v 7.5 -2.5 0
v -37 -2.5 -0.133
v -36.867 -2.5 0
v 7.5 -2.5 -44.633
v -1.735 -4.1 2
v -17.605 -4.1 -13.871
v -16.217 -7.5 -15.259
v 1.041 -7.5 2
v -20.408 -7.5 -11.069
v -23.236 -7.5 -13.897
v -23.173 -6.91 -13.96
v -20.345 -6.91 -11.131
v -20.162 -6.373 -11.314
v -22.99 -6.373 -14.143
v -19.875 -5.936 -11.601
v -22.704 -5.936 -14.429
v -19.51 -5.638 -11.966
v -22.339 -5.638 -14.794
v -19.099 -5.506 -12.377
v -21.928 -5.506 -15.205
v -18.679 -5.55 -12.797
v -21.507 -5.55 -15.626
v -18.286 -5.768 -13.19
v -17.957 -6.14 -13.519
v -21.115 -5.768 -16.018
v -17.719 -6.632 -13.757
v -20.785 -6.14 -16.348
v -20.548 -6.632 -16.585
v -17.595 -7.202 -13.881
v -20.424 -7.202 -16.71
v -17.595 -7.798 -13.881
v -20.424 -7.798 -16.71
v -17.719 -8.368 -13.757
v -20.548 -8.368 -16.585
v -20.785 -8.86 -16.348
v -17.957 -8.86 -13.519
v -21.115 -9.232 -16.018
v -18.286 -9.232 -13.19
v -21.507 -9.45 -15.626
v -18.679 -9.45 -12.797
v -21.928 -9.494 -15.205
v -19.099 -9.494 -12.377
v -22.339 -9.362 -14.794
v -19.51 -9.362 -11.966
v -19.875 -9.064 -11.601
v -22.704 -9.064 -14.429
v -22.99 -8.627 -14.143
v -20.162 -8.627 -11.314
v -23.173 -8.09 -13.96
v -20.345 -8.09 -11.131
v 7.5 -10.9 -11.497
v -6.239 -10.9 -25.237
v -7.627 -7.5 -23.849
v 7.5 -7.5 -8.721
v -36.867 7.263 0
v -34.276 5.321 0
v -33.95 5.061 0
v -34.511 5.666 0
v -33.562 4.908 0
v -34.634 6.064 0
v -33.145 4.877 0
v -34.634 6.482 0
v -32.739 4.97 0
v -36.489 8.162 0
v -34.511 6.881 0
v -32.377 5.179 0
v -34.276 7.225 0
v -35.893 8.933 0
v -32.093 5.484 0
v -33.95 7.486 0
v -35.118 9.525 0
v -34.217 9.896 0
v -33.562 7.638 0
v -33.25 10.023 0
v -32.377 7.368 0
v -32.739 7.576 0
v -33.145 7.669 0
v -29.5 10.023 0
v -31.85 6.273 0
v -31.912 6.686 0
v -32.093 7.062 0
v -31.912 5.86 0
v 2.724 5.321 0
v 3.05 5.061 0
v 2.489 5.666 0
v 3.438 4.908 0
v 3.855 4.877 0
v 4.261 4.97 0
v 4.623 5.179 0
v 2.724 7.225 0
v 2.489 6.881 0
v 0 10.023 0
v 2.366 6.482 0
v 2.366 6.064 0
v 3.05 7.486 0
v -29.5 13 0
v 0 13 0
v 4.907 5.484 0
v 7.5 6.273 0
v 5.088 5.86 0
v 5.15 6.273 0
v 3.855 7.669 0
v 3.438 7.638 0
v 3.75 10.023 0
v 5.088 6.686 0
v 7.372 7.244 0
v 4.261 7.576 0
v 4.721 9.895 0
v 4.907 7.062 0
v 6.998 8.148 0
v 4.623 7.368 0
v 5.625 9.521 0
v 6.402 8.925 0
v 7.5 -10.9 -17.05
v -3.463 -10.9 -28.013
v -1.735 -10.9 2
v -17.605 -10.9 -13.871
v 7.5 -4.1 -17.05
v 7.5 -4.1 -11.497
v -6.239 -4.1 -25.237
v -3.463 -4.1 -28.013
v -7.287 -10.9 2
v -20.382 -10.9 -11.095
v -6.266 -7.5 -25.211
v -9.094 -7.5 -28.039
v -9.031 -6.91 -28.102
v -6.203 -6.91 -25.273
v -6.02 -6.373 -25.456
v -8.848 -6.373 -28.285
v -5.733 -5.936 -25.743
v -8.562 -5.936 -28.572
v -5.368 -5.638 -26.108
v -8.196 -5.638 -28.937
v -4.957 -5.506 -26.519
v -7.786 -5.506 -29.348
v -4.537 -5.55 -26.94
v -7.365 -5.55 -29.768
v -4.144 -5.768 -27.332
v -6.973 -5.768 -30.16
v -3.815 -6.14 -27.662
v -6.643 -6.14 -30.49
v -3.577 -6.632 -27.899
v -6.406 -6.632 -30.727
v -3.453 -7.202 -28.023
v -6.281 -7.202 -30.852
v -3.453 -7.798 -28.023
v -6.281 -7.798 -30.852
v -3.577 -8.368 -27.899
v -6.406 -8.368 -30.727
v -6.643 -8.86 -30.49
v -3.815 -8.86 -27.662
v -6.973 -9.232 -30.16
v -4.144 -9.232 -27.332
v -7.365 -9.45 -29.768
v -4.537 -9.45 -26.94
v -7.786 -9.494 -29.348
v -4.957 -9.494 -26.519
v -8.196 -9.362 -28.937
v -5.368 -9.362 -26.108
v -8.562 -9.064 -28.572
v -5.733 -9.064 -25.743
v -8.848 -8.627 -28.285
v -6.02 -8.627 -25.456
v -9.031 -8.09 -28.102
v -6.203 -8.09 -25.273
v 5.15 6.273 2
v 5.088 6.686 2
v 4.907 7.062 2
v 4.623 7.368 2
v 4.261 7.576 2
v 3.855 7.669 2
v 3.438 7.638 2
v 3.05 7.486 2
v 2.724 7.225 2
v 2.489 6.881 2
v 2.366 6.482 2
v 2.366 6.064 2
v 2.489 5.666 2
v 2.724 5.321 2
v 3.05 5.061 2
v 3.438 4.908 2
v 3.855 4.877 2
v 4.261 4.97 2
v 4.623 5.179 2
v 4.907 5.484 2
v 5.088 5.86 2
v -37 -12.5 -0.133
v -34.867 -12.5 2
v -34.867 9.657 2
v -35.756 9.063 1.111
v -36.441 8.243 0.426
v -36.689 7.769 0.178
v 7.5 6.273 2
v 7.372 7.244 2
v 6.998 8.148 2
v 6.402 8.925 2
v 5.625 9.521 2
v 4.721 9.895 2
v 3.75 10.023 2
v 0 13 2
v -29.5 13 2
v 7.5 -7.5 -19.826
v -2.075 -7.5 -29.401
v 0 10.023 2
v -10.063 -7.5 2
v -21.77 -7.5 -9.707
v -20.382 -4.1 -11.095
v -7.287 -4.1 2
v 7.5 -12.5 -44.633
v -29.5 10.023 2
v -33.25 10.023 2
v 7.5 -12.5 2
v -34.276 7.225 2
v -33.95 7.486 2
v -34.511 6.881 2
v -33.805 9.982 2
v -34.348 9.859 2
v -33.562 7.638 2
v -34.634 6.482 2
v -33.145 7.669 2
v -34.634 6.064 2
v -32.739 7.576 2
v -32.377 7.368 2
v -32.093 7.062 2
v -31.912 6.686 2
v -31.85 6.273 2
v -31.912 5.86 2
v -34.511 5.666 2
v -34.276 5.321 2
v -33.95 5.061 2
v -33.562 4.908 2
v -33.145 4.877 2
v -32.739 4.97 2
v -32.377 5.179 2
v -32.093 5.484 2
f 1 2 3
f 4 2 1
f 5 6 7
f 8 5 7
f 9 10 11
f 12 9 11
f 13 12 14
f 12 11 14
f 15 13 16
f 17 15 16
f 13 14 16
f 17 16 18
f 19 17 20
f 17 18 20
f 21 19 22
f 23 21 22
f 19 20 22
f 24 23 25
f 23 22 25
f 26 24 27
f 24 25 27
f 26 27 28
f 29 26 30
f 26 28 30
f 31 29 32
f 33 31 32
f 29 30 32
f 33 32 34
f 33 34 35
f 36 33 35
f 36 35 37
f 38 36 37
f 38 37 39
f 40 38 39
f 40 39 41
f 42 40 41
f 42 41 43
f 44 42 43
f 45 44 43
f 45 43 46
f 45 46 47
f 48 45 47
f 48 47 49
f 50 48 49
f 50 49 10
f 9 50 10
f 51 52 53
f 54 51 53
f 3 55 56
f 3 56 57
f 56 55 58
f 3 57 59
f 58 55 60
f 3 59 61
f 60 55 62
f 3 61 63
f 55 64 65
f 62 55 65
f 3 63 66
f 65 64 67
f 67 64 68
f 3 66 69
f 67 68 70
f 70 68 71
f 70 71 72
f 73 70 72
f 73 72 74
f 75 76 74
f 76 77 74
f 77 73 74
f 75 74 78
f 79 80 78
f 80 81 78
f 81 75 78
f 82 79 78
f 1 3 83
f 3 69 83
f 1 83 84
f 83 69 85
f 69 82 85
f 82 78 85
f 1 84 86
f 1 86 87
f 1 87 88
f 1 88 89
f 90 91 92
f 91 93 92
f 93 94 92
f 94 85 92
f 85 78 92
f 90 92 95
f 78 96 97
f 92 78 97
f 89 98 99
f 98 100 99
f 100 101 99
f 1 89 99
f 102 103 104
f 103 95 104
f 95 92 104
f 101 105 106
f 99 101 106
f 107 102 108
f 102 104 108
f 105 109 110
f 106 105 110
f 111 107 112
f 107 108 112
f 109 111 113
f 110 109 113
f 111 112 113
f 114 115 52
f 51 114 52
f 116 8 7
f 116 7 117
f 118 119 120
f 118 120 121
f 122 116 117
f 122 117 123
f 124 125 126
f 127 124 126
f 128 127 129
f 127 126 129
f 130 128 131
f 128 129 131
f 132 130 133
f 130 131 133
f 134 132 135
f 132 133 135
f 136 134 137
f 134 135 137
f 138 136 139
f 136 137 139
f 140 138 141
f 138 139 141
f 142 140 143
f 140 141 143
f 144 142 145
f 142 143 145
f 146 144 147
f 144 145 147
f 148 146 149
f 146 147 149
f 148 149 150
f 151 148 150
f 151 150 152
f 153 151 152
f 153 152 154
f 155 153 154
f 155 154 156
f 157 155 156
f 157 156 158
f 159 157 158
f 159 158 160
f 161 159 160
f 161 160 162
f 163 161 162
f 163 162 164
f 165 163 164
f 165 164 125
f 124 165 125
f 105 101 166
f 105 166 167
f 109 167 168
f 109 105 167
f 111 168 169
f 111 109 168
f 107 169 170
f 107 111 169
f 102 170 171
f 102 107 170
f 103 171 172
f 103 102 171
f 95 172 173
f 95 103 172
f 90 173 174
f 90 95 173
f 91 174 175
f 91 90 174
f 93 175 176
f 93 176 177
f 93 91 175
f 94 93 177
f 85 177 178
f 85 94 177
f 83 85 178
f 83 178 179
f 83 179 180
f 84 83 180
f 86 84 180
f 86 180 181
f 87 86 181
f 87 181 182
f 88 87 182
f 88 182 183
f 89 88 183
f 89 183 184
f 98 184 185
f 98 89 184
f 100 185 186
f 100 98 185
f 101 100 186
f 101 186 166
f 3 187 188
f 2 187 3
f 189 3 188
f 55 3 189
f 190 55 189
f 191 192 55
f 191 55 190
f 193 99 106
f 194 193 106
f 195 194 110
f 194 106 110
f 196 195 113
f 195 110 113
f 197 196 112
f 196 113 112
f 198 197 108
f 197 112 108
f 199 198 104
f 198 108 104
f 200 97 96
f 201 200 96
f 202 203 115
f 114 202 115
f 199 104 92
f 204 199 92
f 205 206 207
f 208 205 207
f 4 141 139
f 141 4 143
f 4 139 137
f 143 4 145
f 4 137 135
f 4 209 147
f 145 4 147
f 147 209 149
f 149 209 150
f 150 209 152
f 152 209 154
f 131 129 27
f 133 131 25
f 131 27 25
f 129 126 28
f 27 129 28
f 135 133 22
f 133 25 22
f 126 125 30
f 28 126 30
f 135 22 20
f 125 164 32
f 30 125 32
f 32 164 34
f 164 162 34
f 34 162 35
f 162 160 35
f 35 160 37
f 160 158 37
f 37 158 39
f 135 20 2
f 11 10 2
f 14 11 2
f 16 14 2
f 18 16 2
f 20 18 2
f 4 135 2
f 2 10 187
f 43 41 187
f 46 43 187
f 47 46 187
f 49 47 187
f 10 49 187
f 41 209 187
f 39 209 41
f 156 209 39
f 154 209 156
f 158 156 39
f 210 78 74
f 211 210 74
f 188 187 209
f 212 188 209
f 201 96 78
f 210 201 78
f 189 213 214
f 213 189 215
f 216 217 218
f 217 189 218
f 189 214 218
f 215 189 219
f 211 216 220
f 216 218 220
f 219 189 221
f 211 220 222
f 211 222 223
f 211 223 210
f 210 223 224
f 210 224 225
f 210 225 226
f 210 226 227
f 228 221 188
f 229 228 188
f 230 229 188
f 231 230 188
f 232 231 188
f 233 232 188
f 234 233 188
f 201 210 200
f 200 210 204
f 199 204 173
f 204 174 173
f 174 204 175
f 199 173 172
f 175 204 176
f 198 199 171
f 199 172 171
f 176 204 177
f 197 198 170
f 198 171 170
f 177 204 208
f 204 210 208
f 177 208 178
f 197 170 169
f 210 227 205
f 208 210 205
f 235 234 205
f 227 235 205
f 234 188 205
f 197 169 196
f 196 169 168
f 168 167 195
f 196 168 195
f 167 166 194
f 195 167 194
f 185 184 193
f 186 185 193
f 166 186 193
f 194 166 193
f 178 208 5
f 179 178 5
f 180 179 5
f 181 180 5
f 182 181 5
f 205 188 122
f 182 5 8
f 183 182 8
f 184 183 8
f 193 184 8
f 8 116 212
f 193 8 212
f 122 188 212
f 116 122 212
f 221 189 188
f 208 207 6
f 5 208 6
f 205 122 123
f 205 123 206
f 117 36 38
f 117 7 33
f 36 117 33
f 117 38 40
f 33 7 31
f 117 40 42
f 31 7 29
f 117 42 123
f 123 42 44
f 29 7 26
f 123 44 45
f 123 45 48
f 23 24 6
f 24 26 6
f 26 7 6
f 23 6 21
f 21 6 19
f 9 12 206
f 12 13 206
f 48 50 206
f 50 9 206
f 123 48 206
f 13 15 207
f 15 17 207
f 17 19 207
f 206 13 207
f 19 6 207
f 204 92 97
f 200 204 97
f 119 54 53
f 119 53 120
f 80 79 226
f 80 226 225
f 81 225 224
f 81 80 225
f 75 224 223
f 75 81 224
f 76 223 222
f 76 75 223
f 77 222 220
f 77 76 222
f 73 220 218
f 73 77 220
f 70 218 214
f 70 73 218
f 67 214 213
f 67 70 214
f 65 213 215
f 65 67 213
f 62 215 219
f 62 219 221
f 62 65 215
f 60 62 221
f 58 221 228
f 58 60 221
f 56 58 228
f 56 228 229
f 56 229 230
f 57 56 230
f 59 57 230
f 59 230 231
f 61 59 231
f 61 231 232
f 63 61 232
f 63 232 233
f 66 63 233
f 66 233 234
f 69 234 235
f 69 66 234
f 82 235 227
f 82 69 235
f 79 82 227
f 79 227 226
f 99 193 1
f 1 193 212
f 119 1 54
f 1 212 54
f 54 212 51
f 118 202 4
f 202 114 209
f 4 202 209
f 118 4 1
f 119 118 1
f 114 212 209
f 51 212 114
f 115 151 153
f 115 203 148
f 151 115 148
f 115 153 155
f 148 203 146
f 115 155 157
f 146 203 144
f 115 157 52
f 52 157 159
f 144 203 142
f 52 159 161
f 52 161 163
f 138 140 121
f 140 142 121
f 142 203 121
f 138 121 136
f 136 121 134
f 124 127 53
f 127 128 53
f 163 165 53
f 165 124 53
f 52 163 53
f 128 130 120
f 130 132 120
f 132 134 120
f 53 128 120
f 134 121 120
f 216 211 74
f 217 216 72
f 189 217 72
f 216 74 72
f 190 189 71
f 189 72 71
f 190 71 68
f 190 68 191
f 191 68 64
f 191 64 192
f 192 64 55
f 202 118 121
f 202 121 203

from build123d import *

# Parameters (mm, degrees)
SKETCH1_R           = 1.4
BOSS_EXTRUDE1_DEPTH = 2
BOSS_EXTRUDE2_START = -12.5
BOSS_EXTRUDE2_DEPTH = 10
SKETCH2_R           = 2
CUT_EXTRUDE1_DEPTH  = 40.088742751
CUT_EXTRUDE2_START  = -4
SKETCH2_3_R         = 2
CUT_EXTRUDE2_DEPTH  = 36.088742751
SKETCH4_W           = 3.030010437
SKETCH4_H           = 28.00665459
CUT_EXTRUDE3_DEPTH  = 40.088742751


# Read off the part's stored shape, not the designer's step: Boss-Extrude2
with BuildPart() as part:
    # Sketch1 → Boss-Extrude1 (new body)
    with BuildSketch(Plane.XY):
        with BuildLine():
            Line((7.5, -2.5), (7.5, 6.273123532))
            ThreePointArc((7.5, 6.273123532), (6.401650429, 8.924773961), (3.75, 10.023123532))
            Line((3.75, 10.023123532), (0, 10.023123532))
            Line((0, 10.023123532), (0, 13))
            Line((0, 13), (-29.5, 13))
            Line((-29.5, 13), (-29.5, 10.023123532))
            Line((-29.5, 10.023123532), (-33.25, 10.023123532))
            ThreePointArc((-33.25, 10.023123532), (-35.901650429, 8.924773961), (-37, 6.273123532))
            Line((-37, 6.273123532), (-37, -2.5))
            Line((-37, -2.5), (7.5, -2.5))
        make_face()
        with Locations((3.75, 6.273123532)):
            Circle(SKETCH1_R, mode=Mode.SUBTRACT)
        with Locations((-33.25, 6.273123532)):
            Circle(SKETCH1_R, mode=Mode.SUBTRACT)
    extrude(amount=BOSS_EXTRUDE1_DEPTH)

    # Boss-Extrude2 outline → Boss-Extrude2 (add)
    with BuildSketch(Plane(origin=(0, 0, 0), x_dir=(1, 0, 0), z_dir=(0, 1, 0)).offset(BOSS_EXTRUDE2_START)):
        Polygon((7.5, 44.633095244), (-37, 0.133095244), (-37, -2), (7.5, -2), align=None)
    extrude(amount=BOSS_EXTRUDE2_DEPTH)

    # Sketch2 → Cut-Extrude1 (cut, through all)
    with BuildSketch(Plane(origin=(-18.566547622, 0, -18.566547622), x_dir=(-0.7071067811865457, 0, 0.7071067811865495), z_dir=(-0.7071067811865495, 0, -0.7071067811865457))):
        with Locations((4.603838354, -7.5)):
            Circle(SKETCH2_R)
        with Locations((-15.396161646, -7.5)):
            Circle(SKETCH2_R)
    extrude(amount=-CUT_EXTRUDE1_DEPTH, mode=Mode.SUBTRACT)

    # Sketch2<3> → Cut-Extrude2 (cut, through all)
    # profile 1 of 2: a face of its own
    with BuildSketch(Plane(origin=(-18.566547622, 0, -18.566547622), x_dir=(-0.7071067811865457, 0, 0.7071067811865495), z_dir=(-0.7071067811865495, 0, -0.7071067811865457)).offset(CUT_EXTRUDE2_START)):
        Polygon((8.529820185, -7.5), (6.566829269, -4.1), (2.640847439, -4.1), (0.677856524, -7.5), (2.640847439, -10.9), (6.566829269, -10.9), align=None)
        with Locations((4.603838354, -7.5)):
            Circle(SKETCH2_3_R, mode=Mode.SUBTRACT)
    # profile 2 of 2: a face of its own
    with BuildSketch(Plane(origin=(-18.566547622, 0, -18.566547622), x_dir=(-0.7071067811865457, 0, 0.7071067811865495), z_dir=(-0.7071067811865495, 0, -0.7071067811865457)).offset(CUT_EXTRUDE2_START)):
        Polygon((-11.470179815, -7.5), (-13.433170731, -4.1), (-17.359152561, -4.1), (-19.322143476, -7.5), (-17.359152561, -10.9), (-13.433170731, -10.9), align=None)
        with Locations((-15.396161646, -7.5)):
            Circle(SKETCH2_3_R, mode=Mode.SUBTRACT)
    extrude(amount=-CUT_EXTRUDE2_DEPTH, mode=Mode.SUBTRACT)

    # Sketch4 → Cut-Extrude3 (cut, through all)
    with BuildSketch(Plane(origin=(-18.566547622, 0, -18.566547622), x_dir=(-0.7071067811865457, 0, 0.7071067811865495), z_dir=(-0.7071067811865495, 0, -0.7071067811865457))):
        with Locations((27.583843573, 1.503327295)):
            Rectangle(SKETCH4_W, SKETCH4_H)
    extrude(amount=-CUT_EXTRUDE3_DEPTH, mode=Mode.SUBTRACT)


solid = part.part
